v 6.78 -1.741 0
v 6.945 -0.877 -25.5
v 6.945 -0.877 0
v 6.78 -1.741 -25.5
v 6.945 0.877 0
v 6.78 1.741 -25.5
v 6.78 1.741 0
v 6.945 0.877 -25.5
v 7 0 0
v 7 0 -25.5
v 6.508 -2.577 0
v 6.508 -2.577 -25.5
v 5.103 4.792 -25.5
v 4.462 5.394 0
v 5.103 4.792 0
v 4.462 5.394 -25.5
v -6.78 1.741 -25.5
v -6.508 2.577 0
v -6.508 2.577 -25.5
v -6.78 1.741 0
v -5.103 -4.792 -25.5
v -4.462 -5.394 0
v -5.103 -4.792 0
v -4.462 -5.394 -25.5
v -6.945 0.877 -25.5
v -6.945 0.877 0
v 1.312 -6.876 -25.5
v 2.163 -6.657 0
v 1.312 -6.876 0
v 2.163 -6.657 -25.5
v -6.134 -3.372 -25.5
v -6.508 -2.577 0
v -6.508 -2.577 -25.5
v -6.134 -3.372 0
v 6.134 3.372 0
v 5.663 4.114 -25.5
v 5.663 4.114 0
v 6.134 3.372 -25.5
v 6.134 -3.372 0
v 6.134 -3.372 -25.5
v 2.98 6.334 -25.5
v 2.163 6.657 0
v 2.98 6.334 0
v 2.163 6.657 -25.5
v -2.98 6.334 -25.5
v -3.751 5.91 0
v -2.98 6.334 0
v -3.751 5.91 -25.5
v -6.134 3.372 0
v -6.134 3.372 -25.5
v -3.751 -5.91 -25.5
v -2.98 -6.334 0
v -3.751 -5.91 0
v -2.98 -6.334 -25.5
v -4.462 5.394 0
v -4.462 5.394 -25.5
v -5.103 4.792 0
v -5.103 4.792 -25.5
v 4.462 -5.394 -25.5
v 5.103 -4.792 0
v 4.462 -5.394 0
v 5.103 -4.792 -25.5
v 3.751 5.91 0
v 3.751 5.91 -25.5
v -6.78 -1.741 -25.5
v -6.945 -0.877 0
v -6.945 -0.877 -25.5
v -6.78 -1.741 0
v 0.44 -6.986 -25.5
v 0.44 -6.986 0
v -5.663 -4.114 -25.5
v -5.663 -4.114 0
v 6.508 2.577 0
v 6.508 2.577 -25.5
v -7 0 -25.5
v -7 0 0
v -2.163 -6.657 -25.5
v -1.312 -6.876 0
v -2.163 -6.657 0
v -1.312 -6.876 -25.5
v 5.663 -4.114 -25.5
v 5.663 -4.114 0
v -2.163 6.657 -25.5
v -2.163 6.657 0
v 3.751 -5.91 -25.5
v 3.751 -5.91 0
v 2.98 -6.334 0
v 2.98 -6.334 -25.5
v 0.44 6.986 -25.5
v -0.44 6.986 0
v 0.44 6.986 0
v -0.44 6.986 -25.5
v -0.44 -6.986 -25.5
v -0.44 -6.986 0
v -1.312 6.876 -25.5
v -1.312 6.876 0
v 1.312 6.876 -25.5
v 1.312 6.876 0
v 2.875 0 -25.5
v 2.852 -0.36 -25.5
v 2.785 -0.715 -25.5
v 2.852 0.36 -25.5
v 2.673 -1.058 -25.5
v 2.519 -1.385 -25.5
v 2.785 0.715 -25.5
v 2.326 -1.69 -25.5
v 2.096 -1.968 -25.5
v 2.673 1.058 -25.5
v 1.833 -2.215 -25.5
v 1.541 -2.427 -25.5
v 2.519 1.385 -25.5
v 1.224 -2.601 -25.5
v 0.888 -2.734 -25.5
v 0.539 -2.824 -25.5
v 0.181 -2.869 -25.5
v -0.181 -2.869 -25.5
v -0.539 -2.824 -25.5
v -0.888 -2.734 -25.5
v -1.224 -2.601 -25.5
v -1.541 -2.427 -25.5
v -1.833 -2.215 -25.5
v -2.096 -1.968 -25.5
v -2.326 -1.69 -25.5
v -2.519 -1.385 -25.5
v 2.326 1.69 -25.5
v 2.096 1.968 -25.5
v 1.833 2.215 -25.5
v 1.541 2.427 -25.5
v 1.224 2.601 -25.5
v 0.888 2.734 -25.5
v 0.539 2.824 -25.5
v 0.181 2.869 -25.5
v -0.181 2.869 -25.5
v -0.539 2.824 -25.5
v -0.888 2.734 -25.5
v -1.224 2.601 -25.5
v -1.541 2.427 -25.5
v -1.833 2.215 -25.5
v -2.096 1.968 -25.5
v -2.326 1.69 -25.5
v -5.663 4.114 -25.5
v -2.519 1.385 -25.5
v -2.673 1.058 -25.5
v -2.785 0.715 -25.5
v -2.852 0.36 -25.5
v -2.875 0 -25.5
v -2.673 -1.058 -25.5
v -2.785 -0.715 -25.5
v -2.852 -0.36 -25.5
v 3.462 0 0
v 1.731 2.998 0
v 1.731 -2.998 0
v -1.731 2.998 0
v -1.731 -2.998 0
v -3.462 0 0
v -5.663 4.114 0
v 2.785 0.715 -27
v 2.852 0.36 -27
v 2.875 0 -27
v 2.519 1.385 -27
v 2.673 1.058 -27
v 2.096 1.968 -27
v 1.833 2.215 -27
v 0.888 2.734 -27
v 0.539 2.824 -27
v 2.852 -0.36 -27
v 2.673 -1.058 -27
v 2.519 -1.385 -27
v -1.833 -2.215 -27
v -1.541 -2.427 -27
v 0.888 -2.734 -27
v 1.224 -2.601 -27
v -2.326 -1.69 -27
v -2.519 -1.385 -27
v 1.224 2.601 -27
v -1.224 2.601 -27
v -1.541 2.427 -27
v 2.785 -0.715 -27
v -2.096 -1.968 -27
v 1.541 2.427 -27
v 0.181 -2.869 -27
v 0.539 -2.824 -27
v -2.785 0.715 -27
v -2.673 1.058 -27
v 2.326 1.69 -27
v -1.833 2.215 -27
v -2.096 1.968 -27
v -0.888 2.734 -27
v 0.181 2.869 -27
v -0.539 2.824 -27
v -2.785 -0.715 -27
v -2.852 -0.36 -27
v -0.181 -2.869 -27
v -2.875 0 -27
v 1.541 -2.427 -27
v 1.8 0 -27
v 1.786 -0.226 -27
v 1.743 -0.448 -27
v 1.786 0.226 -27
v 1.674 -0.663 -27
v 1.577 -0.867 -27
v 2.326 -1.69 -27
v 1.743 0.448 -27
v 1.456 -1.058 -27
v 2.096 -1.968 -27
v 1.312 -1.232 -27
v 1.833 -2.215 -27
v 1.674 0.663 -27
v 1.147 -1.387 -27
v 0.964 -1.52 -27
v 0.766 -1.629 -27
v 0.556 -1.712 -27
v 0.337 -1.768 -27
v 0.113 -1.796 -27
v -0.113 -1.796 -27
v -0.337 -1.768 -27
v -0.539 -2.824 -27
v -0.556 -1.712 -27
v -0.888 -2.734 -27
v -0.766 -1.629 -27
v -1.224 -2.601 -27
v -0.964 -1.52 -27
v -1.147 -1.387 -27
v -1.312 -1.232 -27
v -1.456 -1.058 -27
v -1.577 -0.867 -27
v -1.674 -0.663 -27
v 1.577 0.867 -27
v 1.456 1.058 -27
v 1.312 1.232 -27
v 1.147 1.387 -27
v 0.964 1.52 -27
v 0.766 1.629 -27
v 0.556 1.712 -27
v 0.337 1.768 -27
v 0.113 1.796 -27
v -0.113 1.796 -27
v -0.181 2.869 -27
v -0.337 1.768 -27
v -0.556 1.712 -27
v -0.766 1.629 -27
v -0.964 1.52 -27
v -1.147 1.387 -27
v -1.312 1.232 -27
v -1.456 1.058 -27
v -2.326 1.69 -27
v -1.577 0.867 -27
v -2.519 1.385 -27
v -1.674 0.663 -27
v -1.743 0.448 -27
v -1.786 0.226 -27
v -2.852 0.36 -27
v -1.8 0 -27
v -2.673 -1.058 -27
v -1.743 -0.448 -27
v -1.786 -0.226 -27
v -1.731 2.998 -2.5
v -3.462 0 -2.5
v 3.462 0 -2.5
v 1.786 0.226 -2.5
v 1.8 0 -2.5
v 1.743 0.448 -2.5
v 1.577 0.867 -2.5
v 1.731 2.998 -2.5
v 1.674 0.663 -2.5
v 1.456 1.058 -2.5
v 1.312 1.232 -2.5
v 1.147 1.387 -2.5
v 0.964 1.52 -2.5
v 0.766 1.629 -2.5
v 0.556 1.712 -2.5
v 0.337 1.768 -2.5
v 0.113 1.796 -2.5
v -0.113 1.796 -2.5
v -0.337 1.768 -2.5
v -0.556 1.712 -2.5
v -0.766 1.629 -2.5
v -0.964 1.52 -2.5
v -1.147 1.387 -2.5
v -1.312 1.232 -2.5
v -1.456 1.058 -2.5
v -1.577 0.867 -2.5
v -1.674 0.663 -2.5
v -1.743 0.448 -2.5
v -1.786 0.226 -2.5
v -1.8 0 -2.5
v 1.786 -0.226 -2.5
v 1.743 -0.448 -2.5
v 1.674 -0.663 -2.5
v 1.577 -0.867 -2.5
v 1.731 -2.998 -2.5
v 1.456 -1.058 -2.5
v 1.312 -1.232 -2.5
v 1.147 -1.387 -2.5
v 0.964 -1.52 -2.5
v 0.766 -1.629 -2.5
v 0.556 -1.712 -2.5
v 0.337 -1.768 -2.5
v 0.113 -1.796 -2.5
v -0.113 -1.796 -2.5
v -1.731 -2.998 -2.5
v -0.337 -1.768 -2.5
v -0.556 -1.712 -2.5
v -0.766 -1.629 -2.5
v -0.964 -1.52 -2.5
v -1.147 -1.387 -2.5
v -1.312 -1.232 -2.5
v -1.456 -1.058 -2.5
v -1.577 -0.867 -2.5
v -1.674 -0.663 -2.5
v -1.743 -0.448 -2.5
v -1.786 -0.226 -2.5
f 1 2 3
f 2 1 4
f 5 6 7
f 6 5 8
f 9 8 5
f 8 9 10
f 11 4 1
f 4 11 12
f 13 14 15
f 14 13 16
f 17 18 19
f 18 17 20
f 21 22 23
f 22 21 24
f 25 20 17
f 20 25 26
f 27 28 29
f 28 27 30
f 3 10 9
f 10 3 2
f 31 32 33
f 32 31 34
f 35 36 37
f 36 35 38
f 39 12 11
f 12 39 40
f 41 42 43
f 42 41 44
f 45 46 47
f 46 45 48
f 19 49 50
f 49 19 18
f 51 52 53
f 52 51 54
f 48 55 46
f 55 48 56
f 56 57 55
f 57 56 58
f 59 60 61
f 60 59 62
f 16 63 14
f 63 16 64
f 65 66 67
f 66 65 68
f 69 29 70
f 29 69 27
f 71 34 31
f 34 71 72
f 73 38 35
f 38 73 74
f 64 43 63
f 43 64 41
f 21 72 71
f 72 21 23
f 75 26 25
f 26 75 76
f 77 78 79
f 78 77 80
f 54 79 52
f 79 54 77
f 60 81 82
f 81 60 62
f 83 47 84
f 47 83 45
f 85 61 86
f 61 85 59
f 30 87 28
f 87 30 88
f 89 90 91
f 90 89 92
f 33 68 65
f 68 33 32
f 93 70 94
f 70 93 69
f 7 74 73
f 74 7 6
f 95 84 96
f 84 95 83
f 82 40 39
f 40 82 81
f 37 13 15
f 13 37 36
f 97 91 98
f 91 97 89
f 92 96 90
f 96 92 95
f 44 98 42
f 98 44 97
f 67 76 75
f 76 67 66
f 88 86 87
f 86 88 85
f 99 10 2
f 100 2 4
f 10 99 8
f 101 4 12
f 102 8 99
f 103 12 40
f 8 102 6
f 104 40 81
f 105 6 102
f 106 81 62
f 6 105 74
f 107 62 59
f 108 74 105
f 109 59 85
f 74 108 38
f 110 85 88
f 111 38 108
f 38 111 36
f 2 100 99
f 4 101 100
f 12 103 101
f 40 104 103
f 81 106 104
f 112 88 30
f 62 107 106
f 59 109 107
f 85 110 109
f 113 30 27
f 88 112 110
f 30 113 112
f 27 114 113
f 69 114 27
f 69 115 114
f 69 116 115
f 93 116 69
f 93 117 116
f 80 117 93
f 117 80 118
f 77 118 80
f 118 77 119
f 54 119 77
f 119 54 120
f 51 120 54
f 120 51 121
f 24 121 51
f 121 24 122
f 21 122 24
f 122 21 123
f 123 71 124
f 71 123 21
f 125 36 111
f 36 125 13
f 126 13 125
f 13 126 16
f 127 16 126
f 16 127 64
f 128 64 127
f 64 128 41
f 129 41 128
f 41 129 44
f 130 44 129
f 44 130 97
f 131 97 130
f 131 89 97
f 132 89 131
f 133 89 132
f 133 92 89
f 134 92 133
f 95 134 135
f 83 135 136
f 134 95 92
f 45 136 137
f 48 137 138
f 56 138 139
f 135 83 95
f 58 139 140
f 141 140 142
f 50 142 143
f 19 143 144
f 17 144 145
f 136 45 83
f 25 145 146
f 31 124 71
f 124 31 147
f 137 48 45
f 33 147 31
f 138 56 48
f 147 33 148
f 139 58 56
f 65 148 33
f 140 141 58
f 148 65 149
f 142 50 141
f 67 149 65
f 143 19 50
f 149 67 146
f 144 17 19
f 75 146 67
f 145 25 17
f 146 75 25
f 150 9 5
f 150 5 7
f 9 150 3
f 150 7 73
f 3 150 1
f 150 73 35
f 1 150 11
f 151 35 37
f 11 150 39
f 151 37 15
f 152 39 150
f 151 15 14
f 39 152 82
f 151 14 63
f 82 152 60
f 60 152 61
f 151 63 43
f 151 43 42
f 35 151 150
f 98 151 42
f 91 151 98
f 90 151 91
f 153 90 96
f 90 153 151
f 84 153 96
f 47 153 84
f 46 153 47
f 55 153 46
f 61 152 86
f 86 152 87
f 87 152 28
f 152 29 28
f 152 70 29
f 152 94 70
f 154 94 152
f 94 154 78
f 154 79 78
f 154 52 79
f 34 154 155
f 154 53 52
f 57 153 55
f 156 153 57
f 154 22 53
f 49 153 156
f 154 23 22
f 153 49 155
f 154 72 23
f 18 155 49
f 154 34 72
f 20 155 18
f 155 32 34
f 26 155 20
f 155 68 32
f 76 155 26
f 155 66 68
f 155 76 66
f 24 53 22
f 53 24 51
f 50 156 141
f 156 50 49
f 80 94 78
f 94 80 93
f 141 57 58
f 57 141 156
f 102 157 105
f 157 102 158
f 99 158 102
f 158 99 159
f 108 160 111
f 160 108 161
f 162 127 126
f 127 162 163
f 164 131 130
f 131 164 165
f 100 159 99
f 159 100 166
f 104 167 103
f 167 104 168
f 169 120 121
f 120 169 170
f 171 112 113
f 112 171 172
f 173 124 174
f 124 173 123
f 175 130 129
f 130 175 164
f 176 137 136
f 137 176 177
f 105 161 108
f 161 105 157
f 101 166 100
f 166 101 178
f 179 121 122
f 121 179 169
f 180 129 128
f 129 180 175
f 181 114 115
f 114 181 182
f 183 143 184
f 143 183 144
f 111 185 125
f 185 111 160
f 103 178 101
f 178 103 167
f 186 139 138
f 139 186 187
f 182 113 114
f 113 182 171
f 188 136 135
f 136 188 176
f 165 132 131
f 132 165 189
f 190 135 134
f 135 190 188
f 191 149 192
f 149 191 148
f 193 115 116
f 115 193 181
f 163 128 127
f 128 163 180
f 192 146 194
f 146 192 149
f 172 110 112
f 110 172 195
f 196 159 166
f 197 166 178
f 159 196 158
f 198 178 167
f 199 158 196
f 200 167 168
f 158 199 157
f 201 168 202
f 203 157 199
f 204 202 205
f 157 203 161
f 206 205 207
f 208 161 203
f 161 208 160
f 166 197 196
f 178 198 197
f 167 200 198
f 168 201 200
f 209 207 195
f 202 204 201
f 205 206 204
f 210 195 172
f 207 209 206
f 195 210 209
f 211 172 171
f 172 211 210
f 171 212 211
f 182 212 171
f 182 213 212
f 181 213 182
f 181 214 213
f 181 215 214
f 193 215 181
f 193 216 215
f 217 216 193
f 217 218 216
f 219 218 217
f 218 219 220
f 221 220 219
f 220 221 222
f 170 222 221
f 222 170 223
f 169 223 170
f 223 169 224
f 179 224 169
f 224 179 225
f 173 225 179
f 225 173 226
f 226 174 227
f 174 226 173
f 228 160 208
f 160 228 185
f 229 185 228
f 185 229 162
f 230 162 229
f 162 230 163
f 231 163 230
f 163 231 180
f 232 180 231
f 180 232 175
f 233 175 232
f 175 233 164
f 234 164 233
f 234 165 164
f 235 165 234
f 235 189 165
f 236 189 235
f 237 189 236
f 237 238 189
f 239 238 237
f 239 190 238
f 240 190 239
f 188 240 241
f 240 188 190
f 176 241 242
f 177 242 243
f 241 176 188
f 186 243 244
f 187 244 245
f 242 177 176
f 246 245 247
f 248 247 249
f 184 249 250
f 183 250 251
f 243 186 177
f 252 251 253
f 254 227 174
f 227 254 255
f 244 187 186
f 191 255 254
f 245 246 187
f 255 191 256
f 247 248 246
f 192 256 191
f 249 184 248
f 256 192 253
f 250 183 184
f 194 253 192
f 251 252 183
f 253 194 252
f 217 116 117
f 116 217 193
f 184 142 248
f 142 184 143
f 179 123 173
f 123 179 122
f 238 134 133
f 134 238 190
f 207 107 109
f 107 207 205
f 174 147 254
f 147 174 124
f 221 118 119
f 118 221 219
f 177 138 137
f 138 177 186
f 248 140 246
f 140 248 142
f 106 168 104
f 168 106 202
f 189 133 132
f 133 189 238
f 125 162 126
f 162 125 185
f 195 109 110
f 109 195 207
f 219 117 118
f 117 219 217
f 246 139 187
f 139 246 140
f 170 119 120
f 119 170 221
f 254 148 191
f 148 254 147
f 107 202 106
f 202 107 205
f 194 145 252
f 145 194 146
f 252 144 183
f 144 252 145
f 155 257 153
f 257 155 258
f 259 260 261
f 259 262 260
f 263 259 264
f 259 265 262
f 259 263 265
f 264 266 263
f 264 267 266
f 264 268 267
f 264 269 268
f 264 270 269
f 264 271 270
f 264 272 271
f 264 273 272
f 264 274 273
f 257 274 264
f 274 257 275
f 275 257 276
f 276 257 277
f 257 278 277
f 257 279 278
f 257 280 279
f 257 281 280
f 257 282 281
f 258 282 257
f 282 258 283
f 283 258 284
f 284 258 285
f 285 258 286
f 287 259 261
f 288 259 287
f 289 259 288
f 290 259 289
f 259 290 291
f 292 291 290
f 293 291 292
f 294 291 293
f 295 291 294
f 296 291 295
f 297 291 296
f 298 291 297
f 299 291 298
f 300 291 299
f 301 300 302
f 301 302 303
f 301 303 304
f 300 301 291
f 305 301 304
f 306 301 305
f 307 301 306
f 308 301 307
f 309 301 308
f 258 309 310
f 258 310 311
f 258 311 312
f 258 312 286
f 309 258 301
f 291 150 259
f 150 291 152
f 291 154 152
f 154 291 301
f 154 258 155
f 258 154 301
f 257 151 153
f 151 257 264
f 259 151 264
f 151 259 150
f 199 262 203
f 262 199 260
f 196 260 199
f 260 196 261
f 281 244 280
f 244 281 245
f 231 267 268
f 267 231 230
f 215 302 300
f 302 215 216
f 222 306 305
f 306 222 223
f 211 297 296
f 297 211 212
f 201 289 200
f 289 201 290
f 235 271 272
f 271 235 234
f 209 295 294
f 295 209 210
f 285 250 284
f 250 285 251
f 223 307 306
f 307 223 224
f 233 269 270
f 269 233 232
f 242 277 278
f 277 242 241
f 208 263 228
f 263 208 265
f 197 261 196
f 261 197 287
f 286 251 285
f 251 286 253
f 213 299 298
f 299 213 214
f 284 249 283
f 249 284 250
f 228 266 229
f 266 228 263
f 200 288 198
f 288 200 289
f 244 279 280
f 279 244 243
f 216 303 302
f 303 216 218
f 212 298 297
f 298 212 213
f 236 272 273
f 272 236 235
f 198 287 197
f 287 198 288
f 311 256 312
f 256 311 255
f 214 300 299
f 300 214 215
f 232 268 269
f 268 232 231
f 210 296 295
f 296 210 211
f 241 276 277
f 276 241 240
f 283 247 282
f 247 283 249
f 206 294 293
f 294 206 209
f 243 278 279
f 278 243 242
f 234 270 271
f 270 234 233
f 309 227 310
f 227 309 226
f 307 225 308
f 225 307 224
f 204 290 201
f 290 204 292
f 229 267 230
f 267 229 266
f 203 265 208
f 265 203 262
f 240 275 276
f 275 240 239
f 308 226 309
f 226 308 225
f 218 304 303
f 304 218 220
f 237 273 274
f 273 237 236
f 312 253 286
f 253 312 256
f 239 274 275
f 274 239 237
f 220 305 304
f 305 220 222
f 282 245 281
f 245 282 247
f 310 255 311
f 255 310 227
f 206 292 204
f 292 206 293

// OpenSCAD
$fn = 50;

difference() {
	union() {
		translate(v = [0, 0, -25.5]) {
			cylinder(h = 25.5, r = 7.0);
		}
		#translate(v = [0, 0, -27.0]) {
			cylinder(h = 27, r = 2.875);
		}
	}
	union() {
		translate(v = [0, 0, 0]) {
			rotate(a = [0, 0, 0]) {
				difference() {
					union() {
						translate(v = [0, 0, -2.5]) {
							linear_extrude(height = 2.5) {
								polygon(points = [[3.4619999999999997, 0.0], [1.7310000000000003, 2.9981799479017264], [-1.7309999999999992, 2.9981799479017264], [-3.4619999999999997, 4.2397272186481365e-16], [-1.7310000000000014, -2.998179947901726], [1.7309999999999977, -2.9981799479017277]]);
							}
						}
					}
					union();
				}
			}
		}
		#translate(v = [0, 0, -100.0]) {
			cylinder(h = 200, r = 1.8);
		}
	}
}
